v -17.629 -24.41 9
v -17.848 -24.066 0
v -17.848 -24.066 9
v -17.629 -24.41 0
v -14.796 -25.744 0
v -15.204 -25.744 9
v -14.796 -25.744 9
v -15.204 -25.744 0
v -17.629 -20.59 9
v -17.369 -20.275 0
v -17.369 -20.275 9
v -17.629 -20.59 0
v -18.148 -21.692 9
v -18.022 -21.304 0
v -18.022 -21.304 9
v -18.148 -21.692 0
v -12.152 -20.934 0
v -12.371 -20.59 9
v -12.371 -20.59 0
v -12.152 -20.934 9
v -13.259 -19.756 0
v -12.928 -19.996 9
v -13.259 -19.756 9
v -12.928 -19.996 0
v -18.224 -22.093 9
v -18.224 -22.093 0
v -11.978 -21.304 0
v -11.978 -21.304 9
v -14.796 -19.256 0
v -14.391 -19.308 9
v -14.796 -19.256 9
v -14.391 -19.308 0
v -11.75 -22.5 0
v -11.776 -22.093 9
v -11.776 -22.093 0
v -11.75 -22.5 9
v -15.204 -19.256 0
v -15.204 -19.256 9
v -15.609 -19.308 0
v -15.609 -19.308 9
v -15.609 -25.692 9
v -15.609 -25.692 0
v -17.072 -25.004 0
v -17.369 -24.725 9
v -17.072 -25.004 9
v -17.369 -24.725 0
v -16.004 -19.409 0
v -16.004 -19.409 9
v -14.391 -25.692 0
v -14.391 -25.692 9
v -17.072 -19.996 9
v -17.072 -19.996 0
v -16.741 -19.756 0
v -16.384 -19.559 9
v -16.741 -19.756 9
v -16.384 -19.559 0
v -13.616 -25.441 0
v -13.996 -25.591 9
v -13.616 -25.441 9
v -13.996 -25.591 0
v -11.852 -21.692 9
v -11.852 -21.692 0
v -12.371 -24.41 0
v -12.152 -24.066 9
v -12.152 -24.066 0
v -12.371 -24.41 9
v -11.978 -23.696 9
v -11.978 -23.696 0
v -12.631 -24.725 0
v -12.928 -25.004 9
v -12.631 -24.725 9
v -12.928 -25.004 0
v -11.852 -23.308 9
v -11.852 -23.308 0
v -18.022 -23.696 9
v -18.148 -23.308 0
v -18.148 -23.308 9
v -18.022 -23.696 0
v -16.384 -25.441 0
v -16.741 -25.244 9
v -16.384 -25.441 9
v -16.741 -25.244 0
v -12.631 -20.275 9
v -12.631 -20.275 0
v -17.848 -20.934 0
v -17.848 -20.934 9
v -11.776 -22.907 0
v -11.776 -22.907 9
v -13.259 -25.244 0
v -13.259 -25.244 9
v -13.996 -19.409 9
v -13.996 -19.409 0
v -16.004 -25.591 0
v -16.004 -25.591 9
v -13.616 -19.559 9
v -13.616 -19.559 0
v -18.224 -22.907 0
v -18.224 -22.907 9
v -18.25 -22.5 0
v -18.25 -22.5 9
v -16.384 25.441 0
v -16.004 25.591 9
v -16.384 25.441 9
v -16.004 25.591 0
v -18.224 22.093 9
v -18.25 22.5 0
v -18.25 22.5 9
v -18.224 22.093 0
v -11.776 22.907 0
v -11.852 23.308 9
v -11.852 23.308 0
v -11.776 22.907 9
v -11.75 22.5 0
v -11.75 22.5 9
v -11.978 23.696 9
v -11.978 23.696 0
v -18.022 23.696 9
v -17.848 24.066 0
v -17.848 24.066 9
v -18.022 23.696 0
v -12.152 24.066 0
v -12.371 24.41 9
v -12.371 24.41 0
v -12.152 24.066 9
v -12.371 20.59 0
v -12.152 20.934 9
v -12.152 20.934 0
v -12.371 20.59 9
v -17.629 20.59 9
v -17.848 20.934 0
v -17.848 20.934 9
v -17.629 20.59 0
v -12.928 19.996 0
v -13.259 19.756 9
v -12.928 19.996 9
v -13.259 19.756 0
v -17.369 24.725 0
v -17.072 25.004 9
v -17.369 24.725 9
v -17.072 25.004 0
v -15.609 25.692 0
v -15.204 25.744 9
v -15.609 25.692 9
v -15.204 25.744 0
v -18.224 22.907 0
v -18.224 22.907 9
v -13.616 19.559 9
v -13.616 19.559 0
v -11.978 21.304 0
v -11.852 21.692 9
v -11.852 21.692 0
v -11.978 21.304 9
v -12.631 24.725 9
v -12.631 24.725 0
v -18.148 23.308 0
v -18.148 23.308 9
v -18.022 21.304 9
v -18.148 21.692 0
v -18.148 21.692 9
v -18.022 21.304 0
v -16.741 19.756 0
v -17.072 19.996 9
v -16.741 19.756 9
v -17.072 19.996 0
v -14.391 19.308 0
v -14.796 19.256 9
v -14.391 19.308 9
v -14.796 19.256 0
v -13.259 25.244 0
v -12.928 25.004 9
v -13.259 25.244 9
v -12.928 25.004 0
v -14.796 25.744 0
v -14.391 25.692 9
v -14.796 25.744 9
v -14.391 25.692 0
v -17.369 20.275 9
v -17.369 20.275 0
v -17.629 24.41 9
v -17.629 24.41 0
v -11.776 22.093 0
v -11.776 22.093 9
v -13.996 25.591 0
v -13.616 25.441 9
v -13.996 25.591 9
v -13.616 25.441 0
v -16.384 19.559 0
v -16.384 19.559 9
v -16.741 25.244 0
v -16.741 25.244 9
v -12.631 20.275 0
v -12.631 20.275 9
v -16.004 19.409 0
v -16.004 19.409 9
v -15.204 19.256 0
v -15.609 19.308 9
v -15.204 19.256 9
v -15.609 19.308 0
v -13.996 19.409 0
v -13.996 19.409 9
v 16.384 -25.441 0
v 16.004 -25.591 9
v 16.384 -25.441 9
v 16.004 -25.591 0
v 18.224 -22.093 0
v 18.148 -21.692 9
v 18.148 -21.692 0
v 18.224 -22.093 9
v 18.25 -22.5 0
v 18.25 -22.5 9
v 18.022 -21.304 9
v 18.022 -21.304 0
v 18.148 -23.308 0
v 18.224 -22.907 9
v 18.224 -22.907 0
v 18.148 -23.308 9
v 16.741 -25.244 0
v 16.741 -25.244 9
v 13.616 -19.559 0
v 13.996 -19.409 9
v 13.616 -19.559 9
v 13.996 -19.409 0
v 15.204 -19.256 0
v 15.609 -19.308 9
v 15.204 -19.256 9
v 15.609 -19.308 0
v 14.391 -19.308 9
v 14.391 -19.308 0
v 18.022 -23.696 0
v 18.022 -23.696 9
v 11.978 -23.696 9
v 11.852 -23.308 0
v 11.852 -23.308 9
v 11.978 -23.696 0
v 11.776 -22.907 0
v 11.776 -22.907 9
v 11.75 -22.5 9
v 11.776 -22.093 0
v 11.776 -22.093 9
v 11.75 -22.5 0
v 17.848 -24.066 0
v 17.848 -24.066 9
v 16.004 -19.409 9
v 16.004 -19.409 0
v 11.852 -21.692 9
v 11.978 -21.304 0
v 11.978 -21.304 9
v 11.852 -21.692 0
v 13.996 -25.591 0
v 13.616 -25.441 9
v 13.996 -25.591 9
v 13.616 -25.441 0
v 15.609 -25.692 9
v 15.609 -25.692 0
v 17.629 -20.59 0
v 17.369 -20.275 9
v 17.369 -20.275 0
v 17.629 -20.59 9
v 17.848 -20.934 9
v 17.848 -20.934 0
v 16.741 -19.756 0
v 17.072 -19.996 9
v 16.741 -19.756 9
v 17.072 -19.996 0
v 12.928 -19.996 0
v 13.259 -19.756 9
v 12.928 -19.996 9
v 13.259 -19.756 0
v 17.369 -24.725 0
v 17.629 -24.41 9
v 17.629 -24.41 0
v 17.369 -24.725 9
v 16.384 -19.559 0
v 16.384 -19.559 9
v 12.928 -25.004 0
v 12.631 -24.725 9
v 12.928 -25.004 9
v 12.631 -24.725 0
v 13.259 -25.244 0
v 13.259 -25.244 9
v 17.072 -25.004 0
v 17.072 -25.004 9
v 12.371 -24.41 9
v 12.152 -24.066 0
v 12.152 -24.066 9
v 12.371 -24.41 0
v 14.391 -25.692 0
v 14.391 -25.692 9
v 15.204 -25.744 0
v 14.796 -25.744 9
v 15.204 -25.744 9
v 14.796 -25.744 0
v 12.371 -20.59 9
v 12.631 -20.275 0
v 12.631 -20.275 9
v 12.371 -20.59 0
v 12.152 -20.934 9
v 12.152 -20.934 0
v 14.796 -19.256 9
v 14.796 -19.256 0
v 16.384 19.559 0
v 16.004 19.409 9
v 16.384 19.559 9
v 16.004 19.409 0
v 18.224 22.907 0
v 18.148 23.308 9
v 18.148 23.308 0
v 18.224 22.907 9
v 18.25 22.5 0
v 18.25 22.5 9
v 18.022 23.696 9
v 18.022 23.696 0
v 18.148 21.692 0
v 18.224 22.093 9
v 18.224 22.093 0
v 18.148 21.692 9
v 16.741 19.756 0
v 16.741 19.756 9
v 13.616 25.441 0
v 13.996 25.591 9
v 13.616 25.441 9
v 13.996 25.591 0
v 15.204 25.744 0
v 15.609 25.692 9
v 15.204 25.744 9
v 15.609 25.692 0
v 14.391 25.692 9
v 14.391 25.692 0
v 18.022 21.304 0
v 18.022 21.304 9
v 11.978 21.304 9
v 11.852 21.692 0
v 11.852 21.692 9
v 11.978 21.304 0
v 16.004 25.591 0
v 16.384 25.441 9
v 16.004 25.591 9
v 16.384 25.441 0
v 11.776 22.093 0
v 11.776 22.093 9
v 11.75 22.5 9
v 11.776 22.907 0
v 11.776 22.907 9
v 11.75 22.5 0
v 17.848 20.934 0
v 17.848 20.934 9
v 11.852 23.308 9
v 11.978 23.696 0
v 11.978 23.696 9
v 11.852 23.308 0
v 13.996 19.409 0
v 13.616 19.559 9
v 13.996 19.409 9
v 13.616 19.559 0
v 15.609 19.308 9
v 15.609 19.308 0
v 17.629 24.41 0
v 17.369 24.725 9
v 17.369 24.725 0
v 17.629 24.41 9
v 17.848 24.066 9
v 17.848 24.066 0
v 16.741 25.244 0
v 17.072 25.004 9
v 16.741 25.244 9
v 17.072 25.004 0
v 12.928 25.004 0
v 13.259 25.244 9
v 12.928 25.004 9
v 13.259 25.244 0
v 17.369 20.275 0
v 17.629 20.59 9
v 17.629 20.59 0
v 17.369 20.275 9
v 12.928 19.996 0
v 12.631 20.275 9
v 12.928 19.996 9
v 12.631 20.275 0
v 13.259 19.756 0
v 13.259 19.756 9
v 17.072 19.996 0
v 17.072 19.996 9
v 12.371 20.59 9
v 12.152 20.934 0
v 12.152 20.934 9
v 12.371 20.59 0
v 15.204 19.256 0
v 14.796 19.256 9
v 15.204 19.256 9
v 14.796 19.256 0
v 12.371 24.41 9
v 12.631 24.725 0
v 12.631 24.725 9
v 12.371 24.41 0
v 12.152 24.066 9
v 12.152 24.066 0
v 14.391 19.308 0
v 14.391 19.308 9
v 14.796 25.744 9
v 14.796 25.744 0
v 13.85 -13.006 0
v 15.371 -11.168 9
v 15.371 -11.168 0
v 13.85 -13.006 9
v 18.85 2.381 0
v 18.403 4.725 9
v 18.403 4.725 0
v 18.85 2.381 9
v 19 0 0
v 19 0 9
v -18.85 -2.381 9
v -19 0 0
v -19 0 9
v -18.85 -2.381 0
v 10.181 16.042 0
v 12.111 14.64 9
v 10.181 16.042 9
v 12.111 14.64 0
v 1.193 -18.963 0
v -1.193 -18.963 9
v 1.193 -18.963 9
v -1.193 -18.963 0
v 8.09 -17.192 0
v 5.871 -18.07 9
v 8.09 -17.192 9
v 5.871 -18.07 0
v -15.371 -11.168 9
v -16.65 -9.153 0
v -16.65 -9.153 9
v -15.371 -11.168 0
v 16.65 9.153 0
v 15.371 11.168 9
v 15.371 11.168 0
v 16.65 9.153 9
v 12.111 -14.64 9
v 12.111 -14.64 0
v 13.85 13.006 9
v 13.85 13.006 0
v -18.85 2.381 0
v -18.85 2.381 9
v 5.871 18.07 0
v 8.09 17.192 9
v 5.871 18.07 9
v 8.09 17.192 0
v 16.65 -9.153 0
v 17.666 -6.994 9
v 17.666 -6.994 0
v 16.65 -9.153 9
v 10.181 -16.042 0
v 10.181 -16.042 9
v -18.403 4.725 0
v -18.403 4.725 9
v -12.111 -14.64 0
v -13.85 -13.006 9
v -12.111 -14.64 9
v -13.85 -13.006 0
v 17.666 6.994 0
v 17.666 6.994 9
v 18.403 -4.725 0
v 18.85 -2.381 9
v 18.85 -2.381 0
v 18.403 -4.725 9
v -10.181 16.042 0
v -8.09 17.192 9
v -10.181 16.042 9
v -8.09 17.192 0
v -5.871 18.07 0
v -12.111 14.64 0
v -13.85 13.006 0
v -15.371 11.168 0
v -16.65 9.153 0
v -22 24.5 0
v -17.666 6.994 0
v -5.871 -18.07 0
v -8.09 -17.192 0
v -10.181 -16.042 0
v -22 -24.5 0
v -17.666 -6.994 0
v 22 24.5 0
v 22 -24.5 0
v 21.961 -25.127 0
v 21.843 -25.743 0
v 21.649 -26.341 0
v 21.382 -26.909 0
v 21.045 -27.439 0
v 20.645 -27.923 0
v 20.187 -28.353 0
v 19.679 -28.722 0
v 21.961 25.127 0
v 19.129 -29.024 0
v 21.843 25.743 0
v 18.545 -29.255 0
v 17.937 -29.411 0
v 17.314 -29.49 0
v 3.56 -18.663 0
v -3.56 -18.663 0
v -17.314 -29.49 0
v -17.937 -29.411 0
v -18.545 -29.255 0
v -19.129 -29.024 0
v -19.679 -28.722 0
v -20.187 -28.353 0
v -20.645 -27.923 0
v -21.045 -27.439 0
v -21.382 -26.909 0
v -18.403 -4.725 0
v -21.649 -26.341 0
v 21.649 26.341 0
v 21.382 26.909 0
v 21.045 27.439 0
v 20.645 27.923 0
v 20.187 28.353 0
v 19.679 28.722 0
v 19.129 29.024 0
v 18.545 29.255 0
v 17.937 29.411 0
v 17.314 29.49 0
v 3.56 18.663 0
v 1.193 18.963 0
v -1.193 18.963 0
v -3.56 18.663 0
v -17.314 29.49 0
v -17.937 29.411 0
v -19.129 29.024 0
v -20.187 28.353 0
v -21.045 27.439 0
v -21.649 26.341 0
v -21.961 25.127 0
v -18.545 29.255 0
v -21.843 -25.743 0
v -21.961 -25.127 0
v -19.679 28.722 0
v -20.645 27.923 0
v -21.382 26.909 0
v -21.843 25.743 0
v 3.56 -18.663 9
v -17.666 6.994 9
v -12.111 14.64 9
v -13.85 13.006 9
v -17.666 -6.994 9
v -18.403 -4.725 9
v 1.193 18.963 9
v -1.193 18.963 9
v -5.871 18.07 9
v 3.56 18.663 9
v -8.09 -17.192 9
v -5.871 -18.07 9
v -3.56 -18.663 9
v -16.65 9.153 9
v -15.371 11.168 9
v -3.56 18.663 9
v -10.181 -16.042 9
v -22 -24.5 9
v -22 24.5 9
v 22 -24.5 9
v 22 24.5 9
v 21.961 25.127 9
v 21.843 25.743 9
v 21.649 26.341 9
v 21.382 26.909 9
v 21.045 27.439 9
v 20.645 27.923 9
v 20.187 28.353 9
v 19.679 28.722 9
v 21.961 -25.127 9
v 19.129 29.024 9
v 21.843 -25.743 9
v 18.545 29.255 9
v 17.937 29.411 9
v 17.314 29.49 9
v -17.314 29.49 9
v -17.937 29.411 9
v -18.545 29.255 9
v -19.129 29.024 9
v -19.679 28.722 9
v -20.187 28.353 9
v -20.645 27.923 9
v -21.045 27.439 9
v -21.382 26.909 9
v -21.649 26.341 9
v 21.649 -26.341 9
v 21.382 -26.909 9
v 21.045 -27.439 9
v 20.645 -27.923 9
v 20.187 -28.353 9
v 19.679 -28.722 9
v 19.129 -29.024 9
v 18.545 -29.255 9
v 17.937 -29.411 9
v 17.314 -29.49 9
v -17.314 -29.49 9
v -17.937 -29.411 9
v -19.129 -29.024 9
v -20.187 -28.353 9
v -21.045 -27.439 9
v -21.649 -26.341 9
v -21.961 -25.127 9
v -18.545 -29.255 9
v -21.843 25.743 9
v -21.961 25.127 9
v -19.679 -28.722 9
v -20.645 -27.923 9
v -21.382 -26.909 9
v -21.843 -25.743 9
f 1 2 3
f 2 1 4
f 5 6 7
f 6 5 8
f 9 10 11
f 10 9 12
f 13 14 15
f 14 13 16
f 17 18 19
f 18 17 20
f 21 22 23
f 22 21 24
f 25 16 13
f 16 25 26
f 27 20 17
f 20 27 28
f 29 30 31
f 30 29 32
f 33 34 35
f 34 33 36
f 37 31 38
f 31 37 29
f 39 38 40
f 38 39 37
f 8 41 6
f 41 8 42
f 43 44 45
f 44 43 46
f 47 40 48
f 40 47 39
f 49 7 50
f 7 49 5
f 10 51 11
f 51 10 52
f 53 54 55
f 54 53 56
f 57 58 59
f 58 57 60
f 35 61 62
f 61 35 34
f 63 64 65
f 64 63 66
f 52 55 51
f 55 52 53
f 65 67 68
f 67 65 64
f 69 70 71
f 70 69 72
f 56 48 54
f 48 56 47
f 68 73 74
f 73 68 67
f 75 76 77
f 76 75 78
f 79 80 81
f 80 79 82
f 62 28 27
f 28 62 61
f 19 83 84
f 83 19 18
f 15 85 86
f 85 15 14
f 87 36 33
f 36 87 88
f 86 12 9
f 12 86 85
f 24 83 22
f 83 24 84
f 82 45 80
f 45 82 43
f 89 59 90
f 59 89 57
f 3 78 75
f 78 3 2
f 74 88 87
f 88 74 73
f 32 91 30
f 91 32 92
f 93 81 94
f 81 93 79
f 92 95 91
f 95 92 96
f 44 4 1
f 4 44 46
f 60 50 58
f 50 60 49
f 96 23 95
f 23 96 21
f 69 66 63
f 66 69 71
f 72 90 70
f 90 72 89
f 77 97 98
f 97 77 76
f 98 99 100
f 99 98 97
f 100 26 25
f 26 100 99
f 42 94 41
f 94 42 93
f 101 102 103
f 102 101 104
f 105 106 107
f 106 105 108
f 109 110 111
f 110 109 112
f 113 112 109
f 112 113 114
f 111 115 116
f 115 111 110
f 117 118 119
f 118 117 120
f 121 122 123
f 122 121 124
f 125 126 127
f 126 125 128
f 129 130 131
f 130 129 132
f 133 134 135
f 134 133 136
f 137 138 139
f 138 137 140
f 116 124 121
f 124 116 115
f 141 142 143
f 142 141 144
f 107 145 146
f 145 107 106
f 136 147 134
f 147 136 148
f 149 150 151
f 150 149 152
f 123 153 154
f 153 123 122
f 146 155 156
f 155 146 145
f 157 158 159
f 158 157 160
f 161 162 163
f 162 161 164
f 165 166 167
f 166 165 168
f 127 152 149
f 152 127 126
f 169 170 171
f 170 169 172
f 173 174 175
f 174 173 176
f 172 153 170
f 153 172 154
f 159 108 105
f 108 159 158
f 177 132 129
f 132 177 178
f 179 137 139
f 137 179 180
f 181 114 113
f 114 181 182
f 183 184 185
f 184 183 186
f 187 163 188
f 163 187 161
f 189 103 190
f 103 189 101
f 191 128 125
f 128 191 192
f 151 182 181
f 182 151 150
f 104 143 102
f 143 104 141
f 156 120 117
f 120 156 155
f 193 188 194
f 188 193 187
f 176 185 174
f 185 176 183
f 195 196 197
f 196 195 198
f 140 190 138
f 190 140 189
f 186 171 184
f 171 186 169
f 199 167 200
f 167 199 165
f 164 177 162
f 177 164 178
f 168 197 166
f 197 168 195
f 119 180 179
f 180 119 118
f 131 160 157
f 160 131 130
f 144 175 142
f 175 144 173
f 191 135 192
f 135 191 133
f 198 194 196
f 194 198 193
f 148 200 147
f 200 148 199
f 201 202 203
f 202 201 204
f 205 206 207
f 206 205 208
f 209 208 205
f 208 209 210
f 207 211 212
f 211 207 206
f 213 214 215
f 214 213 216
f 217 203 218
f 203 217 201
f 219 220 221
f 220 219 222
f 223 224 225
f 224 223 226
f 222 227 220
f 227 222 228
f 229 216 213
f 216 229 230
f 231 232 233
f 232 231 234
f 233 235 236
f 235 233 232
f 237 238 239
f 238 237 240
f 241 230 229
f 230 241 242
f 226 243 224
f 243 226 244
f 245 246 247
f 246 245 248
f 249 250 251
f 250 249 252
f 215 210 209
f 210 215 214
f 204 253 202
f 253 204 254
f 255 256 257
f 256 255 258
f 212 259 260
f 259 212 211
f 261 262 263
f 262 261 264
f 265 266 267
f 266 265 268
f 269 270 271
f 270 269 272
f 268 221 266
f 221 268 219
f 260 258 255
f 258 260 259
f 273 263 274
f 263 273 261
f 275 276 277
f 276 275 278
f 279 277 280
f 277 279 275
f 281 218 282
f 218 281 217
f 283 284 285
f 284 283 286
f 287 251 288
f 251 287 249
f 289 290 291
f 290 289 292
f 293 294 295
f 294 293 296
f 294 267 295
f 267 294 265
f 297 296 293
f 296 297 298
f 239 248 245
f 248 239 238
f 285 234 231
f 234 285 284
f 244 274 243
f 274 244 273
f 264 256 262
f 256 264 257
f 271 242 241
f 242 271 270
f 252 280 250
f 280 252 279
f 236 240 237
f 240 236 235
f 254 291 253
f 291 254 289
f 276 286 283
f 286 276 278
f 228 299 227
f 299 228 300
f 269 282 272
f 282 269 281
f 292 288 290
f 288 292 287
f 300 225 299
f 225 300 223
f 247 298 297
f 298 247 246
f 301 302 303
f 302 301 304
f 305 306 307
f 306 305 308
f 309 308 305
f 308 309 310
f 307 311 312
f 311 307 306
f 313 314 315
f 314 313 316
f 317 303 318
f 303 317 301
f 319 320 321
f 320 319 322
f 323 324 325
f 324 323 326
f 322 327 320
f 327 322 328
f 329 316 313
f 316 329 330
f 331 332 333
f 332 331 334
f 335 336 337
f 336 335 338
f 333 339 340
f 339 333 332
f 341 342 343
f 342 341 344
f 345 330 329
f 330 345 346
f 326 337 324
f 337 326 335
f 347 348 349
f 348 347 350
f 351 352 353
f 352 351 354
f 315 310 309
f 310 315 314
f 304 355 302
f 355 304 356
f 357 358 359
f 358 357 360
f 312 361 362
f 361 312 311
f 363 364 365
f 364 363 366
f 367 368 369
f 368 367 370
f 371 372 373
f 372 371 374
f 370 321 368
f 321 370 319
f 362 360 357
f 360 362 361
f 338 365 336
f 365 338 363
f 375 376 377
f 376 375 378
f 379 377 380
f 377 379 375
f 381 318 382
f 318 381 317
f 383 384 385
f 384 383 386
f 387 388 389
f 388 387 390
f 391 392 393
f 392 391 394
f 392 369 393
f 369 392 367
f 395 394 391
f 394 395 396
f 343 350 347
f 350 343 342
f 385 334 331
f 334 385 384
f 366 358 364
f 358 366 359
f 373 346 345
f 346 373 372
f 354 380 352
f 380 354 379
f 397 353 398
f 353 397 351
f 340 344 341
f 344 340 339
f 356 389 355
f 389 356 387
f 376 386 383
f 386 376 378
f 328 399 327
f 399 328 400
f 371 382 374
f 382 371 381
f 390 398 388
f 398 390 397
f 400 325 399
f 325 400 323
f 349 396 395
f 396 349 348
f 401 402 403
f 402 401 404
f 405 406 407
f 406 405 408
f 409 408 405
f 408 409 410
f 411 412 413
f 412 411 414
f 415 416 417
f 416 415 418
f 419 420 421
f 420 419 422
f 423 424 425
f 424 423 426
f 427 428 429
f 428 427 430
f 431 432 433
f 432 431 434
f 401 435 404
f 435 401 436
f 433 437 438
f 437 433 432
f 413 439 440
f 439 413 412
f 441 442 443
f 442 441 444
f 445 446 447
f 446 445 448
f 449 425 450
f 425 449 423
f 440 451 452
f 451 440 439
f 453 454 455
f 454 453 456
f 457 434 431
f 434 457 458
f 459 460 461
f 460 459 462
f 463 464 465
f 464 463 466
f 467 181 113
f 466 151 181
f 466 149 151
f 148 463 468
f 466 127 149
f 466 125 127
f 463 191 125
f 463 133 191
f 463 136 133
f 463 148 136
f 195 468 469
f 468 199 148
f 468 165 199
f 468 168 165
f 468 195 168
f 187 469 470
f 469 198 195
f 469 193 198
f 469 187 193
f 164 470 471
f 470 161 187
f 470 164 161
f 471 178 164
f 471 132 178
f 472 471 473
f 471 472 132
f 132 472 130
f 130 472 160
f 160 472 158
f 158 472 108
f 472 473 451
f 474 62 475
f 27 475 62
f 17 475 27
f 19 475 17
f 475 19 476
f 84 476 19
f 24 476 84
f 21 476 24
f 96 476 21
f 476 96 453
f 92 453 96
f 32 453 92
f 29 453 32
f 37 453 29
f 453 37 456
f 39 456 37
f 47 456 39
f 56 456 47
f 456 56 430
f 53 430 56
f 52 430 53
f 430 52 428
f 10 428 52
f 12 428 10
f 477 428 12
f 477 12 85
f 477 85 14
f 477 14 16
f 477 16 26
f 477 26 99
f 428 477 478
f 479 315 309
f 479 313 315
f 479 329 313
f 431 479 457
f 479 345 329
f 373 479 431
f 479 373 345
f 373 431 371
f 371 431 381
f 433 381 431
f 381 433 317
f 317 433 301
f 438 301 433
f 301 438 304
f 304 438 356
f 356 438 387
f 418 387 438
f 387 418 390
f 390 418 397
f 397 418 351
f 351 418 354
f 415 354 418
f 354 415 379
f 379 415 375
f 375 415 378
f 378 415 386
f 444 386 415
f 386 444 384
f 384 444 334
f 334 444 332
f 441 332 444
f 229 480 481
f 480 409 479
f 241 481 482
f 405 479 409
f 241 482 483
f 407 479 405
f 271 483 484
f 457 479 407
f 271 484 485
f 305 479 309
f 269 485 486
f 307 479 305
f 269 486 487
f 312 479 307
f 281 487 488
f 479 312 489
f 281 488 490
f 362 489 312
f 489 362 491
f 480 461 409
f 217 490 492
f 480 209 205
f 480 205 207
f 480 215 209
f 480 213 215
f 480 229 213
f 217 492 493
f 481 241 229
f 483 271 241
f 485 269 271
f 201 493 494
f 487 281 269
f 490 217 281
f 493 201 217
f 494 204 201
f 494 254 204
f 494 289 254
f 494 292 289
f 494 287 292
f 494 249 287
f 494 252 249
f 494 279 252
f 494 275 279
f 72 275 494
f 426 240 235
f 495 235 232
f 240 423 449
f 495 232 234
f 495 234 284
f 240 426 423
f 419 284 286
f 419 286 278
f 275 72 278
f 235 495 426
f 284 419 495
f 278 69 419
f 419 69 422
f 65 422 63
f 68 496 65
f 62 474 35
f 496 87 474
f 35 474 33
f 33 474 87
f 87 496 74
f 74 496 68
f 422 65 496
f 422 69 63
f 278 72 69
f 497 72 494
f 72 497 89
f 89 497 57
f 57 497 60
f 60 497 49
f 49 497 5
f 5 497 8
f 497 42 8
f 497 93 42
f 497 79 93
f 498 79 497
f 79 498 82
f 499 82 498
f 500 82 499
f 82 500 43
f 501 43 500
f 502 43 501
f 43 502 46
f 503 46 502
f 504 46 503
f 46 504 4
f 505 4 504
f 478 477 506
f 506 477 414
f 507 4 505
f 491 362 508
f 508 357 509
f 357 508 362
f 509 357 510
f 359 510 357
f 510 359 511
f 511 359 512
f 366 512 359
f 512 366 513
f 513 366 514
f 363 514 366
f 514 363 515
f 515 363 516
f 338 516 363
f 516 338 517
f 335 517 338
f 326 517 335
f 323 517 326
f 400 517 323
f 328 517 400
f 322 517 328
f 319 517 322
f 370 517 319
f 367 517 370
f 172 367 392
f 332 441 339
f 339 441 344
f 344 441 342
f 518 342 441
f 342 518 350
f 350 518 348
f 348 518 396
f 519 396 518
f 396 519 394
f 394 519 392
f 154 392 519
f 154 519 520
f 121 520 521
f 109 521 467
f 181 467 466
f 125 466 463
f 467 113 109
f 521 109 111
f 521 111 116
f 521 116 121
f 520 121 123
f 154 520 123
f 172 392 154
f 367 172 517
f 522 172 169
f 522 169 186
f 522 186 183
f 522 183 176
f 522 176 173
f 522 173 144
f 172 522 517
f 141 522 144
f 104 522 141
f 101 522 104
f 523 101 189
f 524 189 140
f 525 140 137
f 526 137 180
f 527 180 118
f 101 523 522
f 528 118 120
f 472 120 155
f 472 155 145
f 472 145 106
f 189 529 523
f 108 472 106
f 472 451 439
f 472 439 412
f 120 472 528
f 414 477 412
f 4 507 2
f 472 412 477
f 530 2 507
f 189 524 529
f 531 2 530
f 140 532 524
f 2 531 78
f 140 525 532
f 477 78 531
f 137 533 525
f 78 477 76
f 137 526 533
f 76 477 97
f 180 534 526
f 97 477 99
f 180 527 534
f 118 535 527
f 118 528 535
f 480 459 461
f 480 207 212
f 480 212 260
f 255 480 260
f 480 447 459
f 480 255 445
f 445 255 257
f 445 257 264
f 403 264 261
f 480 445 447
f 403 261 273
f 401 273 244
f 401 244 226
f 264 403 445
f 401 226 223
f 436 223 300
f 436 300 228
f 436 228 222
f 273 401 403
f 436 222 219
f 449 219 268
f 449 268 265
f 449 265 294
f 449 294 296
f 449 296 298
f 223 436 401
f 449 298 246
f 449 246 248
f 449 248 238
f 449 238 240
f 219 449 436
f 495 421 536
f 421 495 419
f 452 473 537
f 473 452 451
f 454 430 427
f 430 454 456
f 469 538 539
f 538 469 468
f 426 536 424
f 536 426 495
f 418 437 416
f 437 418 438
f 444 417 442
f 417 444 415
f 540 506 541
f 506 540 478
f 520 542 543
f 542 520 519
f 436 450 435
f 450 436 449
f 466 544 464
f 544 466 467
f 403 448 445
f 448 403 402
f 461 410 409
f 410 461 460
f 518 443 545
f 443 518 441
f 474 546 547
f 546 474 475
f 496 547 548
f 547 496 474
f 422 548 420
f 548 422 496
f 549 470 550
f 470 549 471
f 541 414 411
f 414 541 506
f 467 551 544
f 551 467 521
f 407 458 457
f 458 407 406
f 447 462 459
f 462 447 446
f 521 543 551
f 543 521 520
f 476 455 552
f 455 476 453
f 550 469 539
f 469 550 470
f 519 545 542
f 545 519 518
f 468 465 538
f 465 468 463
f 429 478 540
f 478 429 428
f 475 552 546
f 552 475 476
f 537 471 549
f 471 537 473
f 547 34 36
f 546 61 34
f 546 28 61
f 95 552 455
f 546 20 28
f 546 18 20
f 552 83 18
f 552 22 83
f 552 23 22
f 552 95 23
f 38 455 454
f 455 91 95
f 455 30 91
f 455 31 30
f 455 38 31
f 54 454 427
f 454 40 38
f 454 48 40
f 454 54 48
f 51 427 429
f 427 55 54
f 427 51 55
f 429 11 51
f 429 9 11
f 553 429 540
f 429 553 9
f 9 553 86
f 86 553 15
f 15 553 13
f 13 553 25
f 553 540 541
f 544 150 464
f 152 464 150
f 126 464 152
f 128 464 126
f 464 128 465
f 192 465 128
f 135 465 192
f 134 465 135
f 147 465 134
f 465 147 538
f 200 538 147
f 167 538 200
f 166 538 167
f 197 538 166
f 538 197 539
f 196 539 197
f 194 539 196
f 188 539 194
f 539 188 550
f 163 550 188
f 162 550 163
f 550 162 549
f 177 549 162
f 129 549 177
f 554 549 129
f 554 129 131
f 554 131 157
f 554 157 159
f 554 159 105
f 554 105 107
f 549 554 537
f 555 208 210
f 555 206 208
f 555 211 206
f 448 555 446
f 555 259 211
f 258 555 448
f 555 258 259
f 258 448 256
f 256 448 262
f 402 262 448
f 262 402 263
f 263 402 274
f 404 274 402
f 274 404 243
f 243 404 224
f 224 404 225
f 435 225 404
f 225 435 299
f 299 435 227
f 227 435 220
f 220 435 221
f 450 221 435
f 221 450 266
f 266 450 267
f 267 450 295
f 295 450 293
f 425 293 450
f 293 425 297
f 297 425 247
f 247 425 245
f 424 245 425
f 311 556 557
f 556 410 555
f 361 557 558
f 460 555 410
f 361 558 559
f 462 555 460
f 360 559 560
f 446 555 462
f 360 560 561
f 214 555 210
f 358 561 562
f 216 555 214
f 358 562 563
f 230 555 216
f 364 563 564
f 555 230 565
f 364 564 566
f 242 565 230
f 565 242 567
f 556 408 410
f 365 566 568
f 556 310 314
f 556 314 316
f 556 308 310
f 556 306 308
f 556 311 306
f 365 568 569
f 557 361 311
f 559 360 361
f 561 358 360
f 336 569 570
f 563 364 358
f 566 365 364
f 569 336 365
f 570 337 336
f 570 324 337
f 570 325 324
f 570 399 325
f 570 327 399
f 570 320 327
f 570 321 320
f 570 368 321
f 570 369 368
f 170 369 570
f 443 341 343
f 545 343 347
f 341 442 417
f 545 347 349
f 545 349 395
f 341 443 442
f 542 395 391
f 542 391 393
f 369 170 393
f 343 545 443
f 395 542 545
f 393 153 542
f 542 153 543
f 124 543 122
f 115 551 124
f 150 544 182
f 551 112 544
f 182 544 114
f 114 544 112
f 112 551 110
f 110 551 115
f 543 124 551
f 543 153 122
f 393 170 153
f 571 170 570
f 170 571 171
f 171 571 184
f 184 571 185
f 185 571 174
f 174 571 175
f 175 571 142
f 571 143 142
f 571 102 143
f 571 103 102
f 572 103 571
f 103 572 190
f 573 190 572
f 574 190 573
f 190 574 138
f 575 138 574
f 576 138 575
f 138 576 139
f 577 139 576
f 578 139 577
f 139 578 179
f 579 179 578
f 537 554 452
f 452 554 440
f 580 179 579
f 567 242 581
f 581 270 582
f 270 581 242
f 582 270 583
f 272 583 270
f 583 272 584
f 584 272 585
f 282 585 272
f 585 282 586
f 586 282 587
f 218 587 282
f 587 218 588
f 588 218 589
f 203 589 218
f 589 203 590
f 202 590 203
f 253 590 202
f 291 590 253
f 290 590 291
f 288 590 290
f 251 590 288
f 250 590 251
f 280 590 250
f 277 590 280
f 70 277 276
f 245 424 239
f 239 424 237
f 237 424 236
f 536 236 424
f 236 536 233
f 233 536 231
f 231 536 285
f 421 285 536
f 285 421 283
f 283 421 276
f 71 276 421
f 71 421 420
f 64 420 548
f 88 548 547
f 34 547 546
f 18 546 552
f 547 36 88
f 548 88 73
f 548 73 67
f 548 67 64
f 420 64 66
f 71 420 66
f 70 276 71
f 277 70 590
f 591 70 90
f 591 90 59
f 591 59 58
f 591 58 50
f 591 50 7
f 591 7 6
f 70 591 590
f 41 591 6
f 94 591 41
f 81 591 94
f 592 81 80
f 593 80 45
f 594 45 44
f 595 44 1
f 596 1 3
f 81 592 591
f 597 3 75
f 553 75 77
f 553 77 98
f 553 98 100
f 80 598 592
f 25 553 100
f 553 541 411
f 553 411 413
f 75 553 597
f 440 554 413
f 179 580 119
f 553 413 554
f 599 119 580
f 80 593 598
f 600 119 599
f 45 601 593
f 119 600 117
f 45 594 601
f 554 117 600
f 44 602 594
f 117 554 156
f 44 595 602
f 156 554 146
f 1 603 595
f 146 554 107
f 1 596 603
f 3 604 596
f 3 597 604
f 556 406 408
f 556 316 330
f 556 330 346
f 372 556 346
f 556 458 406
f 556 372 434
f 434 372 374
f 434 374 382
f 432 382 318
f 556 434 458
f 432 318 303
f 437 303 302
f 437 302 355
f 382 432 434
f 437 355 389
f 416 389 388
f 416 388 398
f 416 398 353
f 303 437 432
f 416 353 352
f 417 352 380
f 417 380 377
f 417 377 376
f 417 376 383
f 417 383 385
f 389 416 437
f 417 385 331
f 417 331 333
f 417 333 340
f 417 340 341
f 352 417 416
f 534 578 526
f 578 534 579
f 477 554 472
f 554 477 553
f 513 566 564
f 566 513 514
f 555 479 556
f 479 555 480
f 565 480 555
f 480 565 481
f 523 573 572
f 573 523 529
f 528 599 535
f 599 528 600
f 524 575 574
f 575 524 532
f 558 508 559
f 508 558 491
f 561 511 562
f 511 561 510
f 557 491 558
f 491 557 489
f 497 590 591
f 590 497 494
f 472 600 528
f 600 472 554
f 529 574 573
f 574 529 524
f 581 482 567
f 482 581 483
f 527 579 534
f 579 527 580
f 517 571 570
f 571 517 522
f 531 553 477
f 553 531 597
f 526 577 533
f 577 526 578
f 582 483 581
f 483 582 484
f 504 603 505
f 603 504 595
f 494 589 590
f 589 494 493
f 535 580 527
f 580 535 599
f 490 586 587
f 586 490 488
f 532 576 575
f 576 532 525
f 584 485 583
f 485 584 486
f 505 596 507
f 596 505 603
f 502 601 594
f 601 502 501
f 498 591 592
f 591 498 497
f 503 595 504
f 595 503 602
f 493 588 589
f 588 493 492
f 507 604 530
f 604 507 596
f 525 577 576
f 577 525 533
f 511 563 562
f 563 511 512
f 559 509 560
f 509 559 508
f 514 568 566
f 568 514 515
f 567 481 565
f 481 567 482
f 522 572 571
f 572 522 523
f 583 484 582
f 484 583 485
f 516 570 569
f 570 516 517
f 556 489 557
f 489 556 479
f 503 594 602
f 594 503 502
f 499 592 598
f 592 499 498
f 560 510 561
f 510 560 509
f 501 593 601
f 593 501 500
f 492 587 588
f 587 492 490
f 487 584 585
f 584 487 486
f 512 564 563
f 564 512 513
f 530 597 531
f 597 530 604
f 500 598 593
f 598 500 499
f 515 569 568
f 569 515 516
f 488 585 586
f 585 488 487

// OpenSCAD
$fn = 50;


difference() {
	union() {
		hull() {
			translate(v = [-17.0000000000, 24.5000000000, 0]) {
				cylinder(h = 9, r = 5);
			}
			translate(v = [17.0000000000, 24.5000000000, 0]) {
				cylinder(h = 9, r = 5);
			}
			translate(v = [-17.0000000000, -24.5000000000, 0]) {
				cylinder(h = 9, r = 5);
			}
			translate(v = [17.0000000000, -24.5000000000, 0]) {
				cylinder(h = 9, r = 5);
			}
		}
	}
	union() {
		#translate(v = [-15.0000000000, -22.5000000000, -100.0000000000]) {
			cylinder(h = 200, r = 3.2500000000);
		}
		#translate(v = [-15.0000000000, 22.5000000000, -100.0000000000]) {
			cylinder(h = 200, r = 3.2500000000);
		}
		#translate(v = [15.0000000000, -22.5000000000, -100.0000000000]) {
			cylinder(h = 200, r = 3.2500000000);
		}
		#translate(v = [15.0000000000, 22.5000000000, -100.0000000000]) {
			cylinder(h = 200, r = 3.2500000000);
		}
		#cylinder(h = 9, r = 19.0000000000);
	}
}
